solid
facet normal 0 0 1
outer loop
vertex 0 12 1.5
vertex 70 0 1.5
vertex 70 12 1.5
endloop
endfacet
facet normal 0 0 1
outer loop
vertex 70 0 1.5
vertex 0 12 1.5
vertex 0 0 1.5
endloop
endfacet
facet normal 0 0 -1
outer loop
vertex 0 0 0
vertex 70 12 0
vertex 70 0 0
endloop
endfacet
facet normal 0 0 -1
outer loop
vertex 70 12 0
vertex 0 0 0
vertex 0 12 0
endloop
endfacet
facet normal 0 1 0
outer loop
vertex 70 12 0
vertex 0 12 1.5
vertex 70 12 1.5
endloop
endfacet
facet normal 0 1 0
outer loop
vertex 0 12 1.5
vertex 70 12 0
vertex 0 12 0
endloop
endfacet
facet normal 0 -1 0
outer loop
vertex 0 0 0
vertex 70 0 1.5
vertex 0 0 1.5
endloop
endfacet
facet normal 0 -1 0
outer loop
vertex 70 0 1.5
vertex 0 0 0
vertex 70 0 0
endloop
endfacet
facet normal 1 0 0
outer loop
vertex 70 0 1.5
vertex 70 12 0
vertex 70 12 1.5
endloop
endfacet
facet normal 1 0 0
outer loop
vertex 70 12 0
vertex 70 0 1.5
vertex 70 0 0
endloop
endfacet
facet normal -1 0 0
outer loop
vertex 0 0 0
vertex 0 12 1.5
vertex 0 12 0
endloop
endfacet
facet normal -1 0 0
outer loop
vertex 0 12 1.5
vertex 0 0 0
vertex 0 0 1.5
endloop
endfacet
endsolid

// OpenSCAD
// Dimensions for the 10-well comb design

// Overall dimensions
spine_length = 70;    // Length of the spine (X dimension) in mm
spine_width = 12;      // Width of the spine (Y dimension) in mm
plate_thickness = 1.5; // Thickness of the plate (Z dimension)

// Tooth dimensions
num_teeth = 10;        // Number of teeth
tooth_width = 5.0;     // Width of each tooth (X dimension)
tooth_length = 12;     // Length of each tooth (Y dimension)
gap_width = 1.5;       // Gap between neighboring teeth (Y dimension)

// Positioning calculations
// The row of teeth is centered on the spine in X.
// Total width occupied by teeth and gaps: (num_teeth * tooth_width) + ((num_teeth - 1) * gap_width)
total_tooth_and_gap_width = (num_teeth * tooth_width) + ((num_teeth - 1) * gap_width);

// Calculate the starting position for centering the teeth along the spine (X-axis).
// The total width of the comb structure in Y is determined by the teeth arrangement.
// We center this arrangement within the spine_width (12 mm).
// Center offset = (spine_width - total_tooth_and_gap_width) / 2
x_offset = (spine_width - total_tooth_and_gap_width) / 2;

// Calculate the starting X position for the first tooth.
start_x = x_offset;

// The spine extends from X=0 to X=spine_length (70 mm).
// We center the entire structure in X if necessary, but the prompt implies the spine is 70mm long.
// Let's assume the spine runs from X=0 to X=70 for simplicity of placement relative to the origin,
// and we will center the tooth arrangement within this length.

// Center the tooth arrangement along the spine_length (X-axis)
x_center = spine_length / 2;

// Calculate the starting position for the first tooth based on centering it around x_center
tooth_start_x = x_center - (total_tooth_and_gap_width / 2);


// --- Main Body Construction ---

// 1. The main flat plate (Spine)
difference() {
    // Base block for the entire comb structure
    cube([spine_length, spine_width, plate_thickness]);

    // Cut out the space for the teeth (This is complex as teeth hang down from one edge)
    // We will define the main body first and then subtract the empty spaces where teeth should be.

    // For simplicity in modeling a flat comb lying on XY plane:
    // The spine is defined by its length (X) and width (Y).
    // Teeth hang in the -Y direction from one long edge. Let's assume the teeth hang from Y = spine_width (12mm side).

    // Define the area where teeth will be cut out (the space between them)
    for (i = [0 : num_teeth - 1]) {
        // Calculate the center X position for the i-th tooth
        tooth_center_x = tooth_start_x + (i * (tooth_width + gap_width));

        // Define the rectangular slot to be removed (Tooth space)
        // Tooth runs along X, has width tooth_width. It hangs down in Y direction.
        // Since teeth hang from one long edge, let's assume they are cut into the plate thickness area.

        // If we interpret "hang from one long edge" as extending into the Z space (which is not typical for a flat comb),
        // or if it means the tooth structure extends in the -Y direction *from* the spine surface.
        // Given the description: "10 rectangular teeth that hang from one long edge of the spine in the -Y direction."

        // Let's model the plate as the base, and the teeth as extrusions/cuts extending into negative Y space relative to the spine center line.

        // Since we are building a flat plate (Z=1.5), the teeth must be modeled as features cut *into* this plate or extruded from it.
        // Assuming the teeth are rectangular slots cut into the 1.5mm thick plate, running along X and extending in -Y.

        // Tooth slot dimensions: Width = tooth_width (X), Length = tooth_length (Y) -> This seems contradictory if Y is the direction of hanging.
        // Let's assume: Tooth runs along X (5mm wide), extends into -Y by 12mm, and has a thickness defined by plate_thickness.

        // We will model the teeth as rectangular prisms cut out from the main block.
        translate([tooth_center_x - tooth_width/2, 0, 0]) {
            cube([tooth_width, tooth_length, plate_thickness]); // This models a feature extending in +Y direction if we use Y=12mm as the extent.

            // Re-interpreting: Teeth hang from one long edge (e.g., Y=spine_width). They extend into -Y.
            // We need to define where this hanging happens relative to the spine's center line.
        }
    }
}

// --- Revised Modeling Strategy: Building the structure piece by piece for clarity and correctness ---

// 1. Build the main plate (Spine)
color("gray")
cube([spine_length, spine_width, plate_thickness]);

// 2. Model the teeth as negative space cutouts extending into -Y direction from Y=spine_width boundary.
difference() {
    // Start with the solid plate
    cube([spine_length, spine_width, plate_thickness]);

    // Cut out the spaces where teeth should be (the gaps)
    for (i = [0 : num_teeth - 1]) {
        // Calculate the center X position for the i-th tooth slot
        tooth_center_x = tooth_start_x + (i * (tooth_width + gap_width));

        // Define the rectangular cutout shape. It runs along X, has width tooth_width, and extends into -Y by tooth_length.
        translate([tooth_center_x - tooth_width/2, spine_width - 0.01, 0]) { // Start slightly inside the edge for clean cut
            cube([tooth_width, tooth_length, plate_thickness]);
        }
    }
}

// Final check: Ensure the structure is centered on X and Y (origin).
// The current model places the spine from X=0 to X=70. If centering is required around origin (X=0), we need translation.
// Since the prompt states "straight spine... 70 mm long (X)", we will keep it starting at X=0, but ensure the tooth arrangement is centered within that 70mm span.

// Final placement adjustment: Shift the entire structure so its center in X aligns with the origin if required by standard practice, or leave it as defined relative to the origin. We will stick to the calculated `tooth_start_x` based on centering the teeth along the spine length (X).
